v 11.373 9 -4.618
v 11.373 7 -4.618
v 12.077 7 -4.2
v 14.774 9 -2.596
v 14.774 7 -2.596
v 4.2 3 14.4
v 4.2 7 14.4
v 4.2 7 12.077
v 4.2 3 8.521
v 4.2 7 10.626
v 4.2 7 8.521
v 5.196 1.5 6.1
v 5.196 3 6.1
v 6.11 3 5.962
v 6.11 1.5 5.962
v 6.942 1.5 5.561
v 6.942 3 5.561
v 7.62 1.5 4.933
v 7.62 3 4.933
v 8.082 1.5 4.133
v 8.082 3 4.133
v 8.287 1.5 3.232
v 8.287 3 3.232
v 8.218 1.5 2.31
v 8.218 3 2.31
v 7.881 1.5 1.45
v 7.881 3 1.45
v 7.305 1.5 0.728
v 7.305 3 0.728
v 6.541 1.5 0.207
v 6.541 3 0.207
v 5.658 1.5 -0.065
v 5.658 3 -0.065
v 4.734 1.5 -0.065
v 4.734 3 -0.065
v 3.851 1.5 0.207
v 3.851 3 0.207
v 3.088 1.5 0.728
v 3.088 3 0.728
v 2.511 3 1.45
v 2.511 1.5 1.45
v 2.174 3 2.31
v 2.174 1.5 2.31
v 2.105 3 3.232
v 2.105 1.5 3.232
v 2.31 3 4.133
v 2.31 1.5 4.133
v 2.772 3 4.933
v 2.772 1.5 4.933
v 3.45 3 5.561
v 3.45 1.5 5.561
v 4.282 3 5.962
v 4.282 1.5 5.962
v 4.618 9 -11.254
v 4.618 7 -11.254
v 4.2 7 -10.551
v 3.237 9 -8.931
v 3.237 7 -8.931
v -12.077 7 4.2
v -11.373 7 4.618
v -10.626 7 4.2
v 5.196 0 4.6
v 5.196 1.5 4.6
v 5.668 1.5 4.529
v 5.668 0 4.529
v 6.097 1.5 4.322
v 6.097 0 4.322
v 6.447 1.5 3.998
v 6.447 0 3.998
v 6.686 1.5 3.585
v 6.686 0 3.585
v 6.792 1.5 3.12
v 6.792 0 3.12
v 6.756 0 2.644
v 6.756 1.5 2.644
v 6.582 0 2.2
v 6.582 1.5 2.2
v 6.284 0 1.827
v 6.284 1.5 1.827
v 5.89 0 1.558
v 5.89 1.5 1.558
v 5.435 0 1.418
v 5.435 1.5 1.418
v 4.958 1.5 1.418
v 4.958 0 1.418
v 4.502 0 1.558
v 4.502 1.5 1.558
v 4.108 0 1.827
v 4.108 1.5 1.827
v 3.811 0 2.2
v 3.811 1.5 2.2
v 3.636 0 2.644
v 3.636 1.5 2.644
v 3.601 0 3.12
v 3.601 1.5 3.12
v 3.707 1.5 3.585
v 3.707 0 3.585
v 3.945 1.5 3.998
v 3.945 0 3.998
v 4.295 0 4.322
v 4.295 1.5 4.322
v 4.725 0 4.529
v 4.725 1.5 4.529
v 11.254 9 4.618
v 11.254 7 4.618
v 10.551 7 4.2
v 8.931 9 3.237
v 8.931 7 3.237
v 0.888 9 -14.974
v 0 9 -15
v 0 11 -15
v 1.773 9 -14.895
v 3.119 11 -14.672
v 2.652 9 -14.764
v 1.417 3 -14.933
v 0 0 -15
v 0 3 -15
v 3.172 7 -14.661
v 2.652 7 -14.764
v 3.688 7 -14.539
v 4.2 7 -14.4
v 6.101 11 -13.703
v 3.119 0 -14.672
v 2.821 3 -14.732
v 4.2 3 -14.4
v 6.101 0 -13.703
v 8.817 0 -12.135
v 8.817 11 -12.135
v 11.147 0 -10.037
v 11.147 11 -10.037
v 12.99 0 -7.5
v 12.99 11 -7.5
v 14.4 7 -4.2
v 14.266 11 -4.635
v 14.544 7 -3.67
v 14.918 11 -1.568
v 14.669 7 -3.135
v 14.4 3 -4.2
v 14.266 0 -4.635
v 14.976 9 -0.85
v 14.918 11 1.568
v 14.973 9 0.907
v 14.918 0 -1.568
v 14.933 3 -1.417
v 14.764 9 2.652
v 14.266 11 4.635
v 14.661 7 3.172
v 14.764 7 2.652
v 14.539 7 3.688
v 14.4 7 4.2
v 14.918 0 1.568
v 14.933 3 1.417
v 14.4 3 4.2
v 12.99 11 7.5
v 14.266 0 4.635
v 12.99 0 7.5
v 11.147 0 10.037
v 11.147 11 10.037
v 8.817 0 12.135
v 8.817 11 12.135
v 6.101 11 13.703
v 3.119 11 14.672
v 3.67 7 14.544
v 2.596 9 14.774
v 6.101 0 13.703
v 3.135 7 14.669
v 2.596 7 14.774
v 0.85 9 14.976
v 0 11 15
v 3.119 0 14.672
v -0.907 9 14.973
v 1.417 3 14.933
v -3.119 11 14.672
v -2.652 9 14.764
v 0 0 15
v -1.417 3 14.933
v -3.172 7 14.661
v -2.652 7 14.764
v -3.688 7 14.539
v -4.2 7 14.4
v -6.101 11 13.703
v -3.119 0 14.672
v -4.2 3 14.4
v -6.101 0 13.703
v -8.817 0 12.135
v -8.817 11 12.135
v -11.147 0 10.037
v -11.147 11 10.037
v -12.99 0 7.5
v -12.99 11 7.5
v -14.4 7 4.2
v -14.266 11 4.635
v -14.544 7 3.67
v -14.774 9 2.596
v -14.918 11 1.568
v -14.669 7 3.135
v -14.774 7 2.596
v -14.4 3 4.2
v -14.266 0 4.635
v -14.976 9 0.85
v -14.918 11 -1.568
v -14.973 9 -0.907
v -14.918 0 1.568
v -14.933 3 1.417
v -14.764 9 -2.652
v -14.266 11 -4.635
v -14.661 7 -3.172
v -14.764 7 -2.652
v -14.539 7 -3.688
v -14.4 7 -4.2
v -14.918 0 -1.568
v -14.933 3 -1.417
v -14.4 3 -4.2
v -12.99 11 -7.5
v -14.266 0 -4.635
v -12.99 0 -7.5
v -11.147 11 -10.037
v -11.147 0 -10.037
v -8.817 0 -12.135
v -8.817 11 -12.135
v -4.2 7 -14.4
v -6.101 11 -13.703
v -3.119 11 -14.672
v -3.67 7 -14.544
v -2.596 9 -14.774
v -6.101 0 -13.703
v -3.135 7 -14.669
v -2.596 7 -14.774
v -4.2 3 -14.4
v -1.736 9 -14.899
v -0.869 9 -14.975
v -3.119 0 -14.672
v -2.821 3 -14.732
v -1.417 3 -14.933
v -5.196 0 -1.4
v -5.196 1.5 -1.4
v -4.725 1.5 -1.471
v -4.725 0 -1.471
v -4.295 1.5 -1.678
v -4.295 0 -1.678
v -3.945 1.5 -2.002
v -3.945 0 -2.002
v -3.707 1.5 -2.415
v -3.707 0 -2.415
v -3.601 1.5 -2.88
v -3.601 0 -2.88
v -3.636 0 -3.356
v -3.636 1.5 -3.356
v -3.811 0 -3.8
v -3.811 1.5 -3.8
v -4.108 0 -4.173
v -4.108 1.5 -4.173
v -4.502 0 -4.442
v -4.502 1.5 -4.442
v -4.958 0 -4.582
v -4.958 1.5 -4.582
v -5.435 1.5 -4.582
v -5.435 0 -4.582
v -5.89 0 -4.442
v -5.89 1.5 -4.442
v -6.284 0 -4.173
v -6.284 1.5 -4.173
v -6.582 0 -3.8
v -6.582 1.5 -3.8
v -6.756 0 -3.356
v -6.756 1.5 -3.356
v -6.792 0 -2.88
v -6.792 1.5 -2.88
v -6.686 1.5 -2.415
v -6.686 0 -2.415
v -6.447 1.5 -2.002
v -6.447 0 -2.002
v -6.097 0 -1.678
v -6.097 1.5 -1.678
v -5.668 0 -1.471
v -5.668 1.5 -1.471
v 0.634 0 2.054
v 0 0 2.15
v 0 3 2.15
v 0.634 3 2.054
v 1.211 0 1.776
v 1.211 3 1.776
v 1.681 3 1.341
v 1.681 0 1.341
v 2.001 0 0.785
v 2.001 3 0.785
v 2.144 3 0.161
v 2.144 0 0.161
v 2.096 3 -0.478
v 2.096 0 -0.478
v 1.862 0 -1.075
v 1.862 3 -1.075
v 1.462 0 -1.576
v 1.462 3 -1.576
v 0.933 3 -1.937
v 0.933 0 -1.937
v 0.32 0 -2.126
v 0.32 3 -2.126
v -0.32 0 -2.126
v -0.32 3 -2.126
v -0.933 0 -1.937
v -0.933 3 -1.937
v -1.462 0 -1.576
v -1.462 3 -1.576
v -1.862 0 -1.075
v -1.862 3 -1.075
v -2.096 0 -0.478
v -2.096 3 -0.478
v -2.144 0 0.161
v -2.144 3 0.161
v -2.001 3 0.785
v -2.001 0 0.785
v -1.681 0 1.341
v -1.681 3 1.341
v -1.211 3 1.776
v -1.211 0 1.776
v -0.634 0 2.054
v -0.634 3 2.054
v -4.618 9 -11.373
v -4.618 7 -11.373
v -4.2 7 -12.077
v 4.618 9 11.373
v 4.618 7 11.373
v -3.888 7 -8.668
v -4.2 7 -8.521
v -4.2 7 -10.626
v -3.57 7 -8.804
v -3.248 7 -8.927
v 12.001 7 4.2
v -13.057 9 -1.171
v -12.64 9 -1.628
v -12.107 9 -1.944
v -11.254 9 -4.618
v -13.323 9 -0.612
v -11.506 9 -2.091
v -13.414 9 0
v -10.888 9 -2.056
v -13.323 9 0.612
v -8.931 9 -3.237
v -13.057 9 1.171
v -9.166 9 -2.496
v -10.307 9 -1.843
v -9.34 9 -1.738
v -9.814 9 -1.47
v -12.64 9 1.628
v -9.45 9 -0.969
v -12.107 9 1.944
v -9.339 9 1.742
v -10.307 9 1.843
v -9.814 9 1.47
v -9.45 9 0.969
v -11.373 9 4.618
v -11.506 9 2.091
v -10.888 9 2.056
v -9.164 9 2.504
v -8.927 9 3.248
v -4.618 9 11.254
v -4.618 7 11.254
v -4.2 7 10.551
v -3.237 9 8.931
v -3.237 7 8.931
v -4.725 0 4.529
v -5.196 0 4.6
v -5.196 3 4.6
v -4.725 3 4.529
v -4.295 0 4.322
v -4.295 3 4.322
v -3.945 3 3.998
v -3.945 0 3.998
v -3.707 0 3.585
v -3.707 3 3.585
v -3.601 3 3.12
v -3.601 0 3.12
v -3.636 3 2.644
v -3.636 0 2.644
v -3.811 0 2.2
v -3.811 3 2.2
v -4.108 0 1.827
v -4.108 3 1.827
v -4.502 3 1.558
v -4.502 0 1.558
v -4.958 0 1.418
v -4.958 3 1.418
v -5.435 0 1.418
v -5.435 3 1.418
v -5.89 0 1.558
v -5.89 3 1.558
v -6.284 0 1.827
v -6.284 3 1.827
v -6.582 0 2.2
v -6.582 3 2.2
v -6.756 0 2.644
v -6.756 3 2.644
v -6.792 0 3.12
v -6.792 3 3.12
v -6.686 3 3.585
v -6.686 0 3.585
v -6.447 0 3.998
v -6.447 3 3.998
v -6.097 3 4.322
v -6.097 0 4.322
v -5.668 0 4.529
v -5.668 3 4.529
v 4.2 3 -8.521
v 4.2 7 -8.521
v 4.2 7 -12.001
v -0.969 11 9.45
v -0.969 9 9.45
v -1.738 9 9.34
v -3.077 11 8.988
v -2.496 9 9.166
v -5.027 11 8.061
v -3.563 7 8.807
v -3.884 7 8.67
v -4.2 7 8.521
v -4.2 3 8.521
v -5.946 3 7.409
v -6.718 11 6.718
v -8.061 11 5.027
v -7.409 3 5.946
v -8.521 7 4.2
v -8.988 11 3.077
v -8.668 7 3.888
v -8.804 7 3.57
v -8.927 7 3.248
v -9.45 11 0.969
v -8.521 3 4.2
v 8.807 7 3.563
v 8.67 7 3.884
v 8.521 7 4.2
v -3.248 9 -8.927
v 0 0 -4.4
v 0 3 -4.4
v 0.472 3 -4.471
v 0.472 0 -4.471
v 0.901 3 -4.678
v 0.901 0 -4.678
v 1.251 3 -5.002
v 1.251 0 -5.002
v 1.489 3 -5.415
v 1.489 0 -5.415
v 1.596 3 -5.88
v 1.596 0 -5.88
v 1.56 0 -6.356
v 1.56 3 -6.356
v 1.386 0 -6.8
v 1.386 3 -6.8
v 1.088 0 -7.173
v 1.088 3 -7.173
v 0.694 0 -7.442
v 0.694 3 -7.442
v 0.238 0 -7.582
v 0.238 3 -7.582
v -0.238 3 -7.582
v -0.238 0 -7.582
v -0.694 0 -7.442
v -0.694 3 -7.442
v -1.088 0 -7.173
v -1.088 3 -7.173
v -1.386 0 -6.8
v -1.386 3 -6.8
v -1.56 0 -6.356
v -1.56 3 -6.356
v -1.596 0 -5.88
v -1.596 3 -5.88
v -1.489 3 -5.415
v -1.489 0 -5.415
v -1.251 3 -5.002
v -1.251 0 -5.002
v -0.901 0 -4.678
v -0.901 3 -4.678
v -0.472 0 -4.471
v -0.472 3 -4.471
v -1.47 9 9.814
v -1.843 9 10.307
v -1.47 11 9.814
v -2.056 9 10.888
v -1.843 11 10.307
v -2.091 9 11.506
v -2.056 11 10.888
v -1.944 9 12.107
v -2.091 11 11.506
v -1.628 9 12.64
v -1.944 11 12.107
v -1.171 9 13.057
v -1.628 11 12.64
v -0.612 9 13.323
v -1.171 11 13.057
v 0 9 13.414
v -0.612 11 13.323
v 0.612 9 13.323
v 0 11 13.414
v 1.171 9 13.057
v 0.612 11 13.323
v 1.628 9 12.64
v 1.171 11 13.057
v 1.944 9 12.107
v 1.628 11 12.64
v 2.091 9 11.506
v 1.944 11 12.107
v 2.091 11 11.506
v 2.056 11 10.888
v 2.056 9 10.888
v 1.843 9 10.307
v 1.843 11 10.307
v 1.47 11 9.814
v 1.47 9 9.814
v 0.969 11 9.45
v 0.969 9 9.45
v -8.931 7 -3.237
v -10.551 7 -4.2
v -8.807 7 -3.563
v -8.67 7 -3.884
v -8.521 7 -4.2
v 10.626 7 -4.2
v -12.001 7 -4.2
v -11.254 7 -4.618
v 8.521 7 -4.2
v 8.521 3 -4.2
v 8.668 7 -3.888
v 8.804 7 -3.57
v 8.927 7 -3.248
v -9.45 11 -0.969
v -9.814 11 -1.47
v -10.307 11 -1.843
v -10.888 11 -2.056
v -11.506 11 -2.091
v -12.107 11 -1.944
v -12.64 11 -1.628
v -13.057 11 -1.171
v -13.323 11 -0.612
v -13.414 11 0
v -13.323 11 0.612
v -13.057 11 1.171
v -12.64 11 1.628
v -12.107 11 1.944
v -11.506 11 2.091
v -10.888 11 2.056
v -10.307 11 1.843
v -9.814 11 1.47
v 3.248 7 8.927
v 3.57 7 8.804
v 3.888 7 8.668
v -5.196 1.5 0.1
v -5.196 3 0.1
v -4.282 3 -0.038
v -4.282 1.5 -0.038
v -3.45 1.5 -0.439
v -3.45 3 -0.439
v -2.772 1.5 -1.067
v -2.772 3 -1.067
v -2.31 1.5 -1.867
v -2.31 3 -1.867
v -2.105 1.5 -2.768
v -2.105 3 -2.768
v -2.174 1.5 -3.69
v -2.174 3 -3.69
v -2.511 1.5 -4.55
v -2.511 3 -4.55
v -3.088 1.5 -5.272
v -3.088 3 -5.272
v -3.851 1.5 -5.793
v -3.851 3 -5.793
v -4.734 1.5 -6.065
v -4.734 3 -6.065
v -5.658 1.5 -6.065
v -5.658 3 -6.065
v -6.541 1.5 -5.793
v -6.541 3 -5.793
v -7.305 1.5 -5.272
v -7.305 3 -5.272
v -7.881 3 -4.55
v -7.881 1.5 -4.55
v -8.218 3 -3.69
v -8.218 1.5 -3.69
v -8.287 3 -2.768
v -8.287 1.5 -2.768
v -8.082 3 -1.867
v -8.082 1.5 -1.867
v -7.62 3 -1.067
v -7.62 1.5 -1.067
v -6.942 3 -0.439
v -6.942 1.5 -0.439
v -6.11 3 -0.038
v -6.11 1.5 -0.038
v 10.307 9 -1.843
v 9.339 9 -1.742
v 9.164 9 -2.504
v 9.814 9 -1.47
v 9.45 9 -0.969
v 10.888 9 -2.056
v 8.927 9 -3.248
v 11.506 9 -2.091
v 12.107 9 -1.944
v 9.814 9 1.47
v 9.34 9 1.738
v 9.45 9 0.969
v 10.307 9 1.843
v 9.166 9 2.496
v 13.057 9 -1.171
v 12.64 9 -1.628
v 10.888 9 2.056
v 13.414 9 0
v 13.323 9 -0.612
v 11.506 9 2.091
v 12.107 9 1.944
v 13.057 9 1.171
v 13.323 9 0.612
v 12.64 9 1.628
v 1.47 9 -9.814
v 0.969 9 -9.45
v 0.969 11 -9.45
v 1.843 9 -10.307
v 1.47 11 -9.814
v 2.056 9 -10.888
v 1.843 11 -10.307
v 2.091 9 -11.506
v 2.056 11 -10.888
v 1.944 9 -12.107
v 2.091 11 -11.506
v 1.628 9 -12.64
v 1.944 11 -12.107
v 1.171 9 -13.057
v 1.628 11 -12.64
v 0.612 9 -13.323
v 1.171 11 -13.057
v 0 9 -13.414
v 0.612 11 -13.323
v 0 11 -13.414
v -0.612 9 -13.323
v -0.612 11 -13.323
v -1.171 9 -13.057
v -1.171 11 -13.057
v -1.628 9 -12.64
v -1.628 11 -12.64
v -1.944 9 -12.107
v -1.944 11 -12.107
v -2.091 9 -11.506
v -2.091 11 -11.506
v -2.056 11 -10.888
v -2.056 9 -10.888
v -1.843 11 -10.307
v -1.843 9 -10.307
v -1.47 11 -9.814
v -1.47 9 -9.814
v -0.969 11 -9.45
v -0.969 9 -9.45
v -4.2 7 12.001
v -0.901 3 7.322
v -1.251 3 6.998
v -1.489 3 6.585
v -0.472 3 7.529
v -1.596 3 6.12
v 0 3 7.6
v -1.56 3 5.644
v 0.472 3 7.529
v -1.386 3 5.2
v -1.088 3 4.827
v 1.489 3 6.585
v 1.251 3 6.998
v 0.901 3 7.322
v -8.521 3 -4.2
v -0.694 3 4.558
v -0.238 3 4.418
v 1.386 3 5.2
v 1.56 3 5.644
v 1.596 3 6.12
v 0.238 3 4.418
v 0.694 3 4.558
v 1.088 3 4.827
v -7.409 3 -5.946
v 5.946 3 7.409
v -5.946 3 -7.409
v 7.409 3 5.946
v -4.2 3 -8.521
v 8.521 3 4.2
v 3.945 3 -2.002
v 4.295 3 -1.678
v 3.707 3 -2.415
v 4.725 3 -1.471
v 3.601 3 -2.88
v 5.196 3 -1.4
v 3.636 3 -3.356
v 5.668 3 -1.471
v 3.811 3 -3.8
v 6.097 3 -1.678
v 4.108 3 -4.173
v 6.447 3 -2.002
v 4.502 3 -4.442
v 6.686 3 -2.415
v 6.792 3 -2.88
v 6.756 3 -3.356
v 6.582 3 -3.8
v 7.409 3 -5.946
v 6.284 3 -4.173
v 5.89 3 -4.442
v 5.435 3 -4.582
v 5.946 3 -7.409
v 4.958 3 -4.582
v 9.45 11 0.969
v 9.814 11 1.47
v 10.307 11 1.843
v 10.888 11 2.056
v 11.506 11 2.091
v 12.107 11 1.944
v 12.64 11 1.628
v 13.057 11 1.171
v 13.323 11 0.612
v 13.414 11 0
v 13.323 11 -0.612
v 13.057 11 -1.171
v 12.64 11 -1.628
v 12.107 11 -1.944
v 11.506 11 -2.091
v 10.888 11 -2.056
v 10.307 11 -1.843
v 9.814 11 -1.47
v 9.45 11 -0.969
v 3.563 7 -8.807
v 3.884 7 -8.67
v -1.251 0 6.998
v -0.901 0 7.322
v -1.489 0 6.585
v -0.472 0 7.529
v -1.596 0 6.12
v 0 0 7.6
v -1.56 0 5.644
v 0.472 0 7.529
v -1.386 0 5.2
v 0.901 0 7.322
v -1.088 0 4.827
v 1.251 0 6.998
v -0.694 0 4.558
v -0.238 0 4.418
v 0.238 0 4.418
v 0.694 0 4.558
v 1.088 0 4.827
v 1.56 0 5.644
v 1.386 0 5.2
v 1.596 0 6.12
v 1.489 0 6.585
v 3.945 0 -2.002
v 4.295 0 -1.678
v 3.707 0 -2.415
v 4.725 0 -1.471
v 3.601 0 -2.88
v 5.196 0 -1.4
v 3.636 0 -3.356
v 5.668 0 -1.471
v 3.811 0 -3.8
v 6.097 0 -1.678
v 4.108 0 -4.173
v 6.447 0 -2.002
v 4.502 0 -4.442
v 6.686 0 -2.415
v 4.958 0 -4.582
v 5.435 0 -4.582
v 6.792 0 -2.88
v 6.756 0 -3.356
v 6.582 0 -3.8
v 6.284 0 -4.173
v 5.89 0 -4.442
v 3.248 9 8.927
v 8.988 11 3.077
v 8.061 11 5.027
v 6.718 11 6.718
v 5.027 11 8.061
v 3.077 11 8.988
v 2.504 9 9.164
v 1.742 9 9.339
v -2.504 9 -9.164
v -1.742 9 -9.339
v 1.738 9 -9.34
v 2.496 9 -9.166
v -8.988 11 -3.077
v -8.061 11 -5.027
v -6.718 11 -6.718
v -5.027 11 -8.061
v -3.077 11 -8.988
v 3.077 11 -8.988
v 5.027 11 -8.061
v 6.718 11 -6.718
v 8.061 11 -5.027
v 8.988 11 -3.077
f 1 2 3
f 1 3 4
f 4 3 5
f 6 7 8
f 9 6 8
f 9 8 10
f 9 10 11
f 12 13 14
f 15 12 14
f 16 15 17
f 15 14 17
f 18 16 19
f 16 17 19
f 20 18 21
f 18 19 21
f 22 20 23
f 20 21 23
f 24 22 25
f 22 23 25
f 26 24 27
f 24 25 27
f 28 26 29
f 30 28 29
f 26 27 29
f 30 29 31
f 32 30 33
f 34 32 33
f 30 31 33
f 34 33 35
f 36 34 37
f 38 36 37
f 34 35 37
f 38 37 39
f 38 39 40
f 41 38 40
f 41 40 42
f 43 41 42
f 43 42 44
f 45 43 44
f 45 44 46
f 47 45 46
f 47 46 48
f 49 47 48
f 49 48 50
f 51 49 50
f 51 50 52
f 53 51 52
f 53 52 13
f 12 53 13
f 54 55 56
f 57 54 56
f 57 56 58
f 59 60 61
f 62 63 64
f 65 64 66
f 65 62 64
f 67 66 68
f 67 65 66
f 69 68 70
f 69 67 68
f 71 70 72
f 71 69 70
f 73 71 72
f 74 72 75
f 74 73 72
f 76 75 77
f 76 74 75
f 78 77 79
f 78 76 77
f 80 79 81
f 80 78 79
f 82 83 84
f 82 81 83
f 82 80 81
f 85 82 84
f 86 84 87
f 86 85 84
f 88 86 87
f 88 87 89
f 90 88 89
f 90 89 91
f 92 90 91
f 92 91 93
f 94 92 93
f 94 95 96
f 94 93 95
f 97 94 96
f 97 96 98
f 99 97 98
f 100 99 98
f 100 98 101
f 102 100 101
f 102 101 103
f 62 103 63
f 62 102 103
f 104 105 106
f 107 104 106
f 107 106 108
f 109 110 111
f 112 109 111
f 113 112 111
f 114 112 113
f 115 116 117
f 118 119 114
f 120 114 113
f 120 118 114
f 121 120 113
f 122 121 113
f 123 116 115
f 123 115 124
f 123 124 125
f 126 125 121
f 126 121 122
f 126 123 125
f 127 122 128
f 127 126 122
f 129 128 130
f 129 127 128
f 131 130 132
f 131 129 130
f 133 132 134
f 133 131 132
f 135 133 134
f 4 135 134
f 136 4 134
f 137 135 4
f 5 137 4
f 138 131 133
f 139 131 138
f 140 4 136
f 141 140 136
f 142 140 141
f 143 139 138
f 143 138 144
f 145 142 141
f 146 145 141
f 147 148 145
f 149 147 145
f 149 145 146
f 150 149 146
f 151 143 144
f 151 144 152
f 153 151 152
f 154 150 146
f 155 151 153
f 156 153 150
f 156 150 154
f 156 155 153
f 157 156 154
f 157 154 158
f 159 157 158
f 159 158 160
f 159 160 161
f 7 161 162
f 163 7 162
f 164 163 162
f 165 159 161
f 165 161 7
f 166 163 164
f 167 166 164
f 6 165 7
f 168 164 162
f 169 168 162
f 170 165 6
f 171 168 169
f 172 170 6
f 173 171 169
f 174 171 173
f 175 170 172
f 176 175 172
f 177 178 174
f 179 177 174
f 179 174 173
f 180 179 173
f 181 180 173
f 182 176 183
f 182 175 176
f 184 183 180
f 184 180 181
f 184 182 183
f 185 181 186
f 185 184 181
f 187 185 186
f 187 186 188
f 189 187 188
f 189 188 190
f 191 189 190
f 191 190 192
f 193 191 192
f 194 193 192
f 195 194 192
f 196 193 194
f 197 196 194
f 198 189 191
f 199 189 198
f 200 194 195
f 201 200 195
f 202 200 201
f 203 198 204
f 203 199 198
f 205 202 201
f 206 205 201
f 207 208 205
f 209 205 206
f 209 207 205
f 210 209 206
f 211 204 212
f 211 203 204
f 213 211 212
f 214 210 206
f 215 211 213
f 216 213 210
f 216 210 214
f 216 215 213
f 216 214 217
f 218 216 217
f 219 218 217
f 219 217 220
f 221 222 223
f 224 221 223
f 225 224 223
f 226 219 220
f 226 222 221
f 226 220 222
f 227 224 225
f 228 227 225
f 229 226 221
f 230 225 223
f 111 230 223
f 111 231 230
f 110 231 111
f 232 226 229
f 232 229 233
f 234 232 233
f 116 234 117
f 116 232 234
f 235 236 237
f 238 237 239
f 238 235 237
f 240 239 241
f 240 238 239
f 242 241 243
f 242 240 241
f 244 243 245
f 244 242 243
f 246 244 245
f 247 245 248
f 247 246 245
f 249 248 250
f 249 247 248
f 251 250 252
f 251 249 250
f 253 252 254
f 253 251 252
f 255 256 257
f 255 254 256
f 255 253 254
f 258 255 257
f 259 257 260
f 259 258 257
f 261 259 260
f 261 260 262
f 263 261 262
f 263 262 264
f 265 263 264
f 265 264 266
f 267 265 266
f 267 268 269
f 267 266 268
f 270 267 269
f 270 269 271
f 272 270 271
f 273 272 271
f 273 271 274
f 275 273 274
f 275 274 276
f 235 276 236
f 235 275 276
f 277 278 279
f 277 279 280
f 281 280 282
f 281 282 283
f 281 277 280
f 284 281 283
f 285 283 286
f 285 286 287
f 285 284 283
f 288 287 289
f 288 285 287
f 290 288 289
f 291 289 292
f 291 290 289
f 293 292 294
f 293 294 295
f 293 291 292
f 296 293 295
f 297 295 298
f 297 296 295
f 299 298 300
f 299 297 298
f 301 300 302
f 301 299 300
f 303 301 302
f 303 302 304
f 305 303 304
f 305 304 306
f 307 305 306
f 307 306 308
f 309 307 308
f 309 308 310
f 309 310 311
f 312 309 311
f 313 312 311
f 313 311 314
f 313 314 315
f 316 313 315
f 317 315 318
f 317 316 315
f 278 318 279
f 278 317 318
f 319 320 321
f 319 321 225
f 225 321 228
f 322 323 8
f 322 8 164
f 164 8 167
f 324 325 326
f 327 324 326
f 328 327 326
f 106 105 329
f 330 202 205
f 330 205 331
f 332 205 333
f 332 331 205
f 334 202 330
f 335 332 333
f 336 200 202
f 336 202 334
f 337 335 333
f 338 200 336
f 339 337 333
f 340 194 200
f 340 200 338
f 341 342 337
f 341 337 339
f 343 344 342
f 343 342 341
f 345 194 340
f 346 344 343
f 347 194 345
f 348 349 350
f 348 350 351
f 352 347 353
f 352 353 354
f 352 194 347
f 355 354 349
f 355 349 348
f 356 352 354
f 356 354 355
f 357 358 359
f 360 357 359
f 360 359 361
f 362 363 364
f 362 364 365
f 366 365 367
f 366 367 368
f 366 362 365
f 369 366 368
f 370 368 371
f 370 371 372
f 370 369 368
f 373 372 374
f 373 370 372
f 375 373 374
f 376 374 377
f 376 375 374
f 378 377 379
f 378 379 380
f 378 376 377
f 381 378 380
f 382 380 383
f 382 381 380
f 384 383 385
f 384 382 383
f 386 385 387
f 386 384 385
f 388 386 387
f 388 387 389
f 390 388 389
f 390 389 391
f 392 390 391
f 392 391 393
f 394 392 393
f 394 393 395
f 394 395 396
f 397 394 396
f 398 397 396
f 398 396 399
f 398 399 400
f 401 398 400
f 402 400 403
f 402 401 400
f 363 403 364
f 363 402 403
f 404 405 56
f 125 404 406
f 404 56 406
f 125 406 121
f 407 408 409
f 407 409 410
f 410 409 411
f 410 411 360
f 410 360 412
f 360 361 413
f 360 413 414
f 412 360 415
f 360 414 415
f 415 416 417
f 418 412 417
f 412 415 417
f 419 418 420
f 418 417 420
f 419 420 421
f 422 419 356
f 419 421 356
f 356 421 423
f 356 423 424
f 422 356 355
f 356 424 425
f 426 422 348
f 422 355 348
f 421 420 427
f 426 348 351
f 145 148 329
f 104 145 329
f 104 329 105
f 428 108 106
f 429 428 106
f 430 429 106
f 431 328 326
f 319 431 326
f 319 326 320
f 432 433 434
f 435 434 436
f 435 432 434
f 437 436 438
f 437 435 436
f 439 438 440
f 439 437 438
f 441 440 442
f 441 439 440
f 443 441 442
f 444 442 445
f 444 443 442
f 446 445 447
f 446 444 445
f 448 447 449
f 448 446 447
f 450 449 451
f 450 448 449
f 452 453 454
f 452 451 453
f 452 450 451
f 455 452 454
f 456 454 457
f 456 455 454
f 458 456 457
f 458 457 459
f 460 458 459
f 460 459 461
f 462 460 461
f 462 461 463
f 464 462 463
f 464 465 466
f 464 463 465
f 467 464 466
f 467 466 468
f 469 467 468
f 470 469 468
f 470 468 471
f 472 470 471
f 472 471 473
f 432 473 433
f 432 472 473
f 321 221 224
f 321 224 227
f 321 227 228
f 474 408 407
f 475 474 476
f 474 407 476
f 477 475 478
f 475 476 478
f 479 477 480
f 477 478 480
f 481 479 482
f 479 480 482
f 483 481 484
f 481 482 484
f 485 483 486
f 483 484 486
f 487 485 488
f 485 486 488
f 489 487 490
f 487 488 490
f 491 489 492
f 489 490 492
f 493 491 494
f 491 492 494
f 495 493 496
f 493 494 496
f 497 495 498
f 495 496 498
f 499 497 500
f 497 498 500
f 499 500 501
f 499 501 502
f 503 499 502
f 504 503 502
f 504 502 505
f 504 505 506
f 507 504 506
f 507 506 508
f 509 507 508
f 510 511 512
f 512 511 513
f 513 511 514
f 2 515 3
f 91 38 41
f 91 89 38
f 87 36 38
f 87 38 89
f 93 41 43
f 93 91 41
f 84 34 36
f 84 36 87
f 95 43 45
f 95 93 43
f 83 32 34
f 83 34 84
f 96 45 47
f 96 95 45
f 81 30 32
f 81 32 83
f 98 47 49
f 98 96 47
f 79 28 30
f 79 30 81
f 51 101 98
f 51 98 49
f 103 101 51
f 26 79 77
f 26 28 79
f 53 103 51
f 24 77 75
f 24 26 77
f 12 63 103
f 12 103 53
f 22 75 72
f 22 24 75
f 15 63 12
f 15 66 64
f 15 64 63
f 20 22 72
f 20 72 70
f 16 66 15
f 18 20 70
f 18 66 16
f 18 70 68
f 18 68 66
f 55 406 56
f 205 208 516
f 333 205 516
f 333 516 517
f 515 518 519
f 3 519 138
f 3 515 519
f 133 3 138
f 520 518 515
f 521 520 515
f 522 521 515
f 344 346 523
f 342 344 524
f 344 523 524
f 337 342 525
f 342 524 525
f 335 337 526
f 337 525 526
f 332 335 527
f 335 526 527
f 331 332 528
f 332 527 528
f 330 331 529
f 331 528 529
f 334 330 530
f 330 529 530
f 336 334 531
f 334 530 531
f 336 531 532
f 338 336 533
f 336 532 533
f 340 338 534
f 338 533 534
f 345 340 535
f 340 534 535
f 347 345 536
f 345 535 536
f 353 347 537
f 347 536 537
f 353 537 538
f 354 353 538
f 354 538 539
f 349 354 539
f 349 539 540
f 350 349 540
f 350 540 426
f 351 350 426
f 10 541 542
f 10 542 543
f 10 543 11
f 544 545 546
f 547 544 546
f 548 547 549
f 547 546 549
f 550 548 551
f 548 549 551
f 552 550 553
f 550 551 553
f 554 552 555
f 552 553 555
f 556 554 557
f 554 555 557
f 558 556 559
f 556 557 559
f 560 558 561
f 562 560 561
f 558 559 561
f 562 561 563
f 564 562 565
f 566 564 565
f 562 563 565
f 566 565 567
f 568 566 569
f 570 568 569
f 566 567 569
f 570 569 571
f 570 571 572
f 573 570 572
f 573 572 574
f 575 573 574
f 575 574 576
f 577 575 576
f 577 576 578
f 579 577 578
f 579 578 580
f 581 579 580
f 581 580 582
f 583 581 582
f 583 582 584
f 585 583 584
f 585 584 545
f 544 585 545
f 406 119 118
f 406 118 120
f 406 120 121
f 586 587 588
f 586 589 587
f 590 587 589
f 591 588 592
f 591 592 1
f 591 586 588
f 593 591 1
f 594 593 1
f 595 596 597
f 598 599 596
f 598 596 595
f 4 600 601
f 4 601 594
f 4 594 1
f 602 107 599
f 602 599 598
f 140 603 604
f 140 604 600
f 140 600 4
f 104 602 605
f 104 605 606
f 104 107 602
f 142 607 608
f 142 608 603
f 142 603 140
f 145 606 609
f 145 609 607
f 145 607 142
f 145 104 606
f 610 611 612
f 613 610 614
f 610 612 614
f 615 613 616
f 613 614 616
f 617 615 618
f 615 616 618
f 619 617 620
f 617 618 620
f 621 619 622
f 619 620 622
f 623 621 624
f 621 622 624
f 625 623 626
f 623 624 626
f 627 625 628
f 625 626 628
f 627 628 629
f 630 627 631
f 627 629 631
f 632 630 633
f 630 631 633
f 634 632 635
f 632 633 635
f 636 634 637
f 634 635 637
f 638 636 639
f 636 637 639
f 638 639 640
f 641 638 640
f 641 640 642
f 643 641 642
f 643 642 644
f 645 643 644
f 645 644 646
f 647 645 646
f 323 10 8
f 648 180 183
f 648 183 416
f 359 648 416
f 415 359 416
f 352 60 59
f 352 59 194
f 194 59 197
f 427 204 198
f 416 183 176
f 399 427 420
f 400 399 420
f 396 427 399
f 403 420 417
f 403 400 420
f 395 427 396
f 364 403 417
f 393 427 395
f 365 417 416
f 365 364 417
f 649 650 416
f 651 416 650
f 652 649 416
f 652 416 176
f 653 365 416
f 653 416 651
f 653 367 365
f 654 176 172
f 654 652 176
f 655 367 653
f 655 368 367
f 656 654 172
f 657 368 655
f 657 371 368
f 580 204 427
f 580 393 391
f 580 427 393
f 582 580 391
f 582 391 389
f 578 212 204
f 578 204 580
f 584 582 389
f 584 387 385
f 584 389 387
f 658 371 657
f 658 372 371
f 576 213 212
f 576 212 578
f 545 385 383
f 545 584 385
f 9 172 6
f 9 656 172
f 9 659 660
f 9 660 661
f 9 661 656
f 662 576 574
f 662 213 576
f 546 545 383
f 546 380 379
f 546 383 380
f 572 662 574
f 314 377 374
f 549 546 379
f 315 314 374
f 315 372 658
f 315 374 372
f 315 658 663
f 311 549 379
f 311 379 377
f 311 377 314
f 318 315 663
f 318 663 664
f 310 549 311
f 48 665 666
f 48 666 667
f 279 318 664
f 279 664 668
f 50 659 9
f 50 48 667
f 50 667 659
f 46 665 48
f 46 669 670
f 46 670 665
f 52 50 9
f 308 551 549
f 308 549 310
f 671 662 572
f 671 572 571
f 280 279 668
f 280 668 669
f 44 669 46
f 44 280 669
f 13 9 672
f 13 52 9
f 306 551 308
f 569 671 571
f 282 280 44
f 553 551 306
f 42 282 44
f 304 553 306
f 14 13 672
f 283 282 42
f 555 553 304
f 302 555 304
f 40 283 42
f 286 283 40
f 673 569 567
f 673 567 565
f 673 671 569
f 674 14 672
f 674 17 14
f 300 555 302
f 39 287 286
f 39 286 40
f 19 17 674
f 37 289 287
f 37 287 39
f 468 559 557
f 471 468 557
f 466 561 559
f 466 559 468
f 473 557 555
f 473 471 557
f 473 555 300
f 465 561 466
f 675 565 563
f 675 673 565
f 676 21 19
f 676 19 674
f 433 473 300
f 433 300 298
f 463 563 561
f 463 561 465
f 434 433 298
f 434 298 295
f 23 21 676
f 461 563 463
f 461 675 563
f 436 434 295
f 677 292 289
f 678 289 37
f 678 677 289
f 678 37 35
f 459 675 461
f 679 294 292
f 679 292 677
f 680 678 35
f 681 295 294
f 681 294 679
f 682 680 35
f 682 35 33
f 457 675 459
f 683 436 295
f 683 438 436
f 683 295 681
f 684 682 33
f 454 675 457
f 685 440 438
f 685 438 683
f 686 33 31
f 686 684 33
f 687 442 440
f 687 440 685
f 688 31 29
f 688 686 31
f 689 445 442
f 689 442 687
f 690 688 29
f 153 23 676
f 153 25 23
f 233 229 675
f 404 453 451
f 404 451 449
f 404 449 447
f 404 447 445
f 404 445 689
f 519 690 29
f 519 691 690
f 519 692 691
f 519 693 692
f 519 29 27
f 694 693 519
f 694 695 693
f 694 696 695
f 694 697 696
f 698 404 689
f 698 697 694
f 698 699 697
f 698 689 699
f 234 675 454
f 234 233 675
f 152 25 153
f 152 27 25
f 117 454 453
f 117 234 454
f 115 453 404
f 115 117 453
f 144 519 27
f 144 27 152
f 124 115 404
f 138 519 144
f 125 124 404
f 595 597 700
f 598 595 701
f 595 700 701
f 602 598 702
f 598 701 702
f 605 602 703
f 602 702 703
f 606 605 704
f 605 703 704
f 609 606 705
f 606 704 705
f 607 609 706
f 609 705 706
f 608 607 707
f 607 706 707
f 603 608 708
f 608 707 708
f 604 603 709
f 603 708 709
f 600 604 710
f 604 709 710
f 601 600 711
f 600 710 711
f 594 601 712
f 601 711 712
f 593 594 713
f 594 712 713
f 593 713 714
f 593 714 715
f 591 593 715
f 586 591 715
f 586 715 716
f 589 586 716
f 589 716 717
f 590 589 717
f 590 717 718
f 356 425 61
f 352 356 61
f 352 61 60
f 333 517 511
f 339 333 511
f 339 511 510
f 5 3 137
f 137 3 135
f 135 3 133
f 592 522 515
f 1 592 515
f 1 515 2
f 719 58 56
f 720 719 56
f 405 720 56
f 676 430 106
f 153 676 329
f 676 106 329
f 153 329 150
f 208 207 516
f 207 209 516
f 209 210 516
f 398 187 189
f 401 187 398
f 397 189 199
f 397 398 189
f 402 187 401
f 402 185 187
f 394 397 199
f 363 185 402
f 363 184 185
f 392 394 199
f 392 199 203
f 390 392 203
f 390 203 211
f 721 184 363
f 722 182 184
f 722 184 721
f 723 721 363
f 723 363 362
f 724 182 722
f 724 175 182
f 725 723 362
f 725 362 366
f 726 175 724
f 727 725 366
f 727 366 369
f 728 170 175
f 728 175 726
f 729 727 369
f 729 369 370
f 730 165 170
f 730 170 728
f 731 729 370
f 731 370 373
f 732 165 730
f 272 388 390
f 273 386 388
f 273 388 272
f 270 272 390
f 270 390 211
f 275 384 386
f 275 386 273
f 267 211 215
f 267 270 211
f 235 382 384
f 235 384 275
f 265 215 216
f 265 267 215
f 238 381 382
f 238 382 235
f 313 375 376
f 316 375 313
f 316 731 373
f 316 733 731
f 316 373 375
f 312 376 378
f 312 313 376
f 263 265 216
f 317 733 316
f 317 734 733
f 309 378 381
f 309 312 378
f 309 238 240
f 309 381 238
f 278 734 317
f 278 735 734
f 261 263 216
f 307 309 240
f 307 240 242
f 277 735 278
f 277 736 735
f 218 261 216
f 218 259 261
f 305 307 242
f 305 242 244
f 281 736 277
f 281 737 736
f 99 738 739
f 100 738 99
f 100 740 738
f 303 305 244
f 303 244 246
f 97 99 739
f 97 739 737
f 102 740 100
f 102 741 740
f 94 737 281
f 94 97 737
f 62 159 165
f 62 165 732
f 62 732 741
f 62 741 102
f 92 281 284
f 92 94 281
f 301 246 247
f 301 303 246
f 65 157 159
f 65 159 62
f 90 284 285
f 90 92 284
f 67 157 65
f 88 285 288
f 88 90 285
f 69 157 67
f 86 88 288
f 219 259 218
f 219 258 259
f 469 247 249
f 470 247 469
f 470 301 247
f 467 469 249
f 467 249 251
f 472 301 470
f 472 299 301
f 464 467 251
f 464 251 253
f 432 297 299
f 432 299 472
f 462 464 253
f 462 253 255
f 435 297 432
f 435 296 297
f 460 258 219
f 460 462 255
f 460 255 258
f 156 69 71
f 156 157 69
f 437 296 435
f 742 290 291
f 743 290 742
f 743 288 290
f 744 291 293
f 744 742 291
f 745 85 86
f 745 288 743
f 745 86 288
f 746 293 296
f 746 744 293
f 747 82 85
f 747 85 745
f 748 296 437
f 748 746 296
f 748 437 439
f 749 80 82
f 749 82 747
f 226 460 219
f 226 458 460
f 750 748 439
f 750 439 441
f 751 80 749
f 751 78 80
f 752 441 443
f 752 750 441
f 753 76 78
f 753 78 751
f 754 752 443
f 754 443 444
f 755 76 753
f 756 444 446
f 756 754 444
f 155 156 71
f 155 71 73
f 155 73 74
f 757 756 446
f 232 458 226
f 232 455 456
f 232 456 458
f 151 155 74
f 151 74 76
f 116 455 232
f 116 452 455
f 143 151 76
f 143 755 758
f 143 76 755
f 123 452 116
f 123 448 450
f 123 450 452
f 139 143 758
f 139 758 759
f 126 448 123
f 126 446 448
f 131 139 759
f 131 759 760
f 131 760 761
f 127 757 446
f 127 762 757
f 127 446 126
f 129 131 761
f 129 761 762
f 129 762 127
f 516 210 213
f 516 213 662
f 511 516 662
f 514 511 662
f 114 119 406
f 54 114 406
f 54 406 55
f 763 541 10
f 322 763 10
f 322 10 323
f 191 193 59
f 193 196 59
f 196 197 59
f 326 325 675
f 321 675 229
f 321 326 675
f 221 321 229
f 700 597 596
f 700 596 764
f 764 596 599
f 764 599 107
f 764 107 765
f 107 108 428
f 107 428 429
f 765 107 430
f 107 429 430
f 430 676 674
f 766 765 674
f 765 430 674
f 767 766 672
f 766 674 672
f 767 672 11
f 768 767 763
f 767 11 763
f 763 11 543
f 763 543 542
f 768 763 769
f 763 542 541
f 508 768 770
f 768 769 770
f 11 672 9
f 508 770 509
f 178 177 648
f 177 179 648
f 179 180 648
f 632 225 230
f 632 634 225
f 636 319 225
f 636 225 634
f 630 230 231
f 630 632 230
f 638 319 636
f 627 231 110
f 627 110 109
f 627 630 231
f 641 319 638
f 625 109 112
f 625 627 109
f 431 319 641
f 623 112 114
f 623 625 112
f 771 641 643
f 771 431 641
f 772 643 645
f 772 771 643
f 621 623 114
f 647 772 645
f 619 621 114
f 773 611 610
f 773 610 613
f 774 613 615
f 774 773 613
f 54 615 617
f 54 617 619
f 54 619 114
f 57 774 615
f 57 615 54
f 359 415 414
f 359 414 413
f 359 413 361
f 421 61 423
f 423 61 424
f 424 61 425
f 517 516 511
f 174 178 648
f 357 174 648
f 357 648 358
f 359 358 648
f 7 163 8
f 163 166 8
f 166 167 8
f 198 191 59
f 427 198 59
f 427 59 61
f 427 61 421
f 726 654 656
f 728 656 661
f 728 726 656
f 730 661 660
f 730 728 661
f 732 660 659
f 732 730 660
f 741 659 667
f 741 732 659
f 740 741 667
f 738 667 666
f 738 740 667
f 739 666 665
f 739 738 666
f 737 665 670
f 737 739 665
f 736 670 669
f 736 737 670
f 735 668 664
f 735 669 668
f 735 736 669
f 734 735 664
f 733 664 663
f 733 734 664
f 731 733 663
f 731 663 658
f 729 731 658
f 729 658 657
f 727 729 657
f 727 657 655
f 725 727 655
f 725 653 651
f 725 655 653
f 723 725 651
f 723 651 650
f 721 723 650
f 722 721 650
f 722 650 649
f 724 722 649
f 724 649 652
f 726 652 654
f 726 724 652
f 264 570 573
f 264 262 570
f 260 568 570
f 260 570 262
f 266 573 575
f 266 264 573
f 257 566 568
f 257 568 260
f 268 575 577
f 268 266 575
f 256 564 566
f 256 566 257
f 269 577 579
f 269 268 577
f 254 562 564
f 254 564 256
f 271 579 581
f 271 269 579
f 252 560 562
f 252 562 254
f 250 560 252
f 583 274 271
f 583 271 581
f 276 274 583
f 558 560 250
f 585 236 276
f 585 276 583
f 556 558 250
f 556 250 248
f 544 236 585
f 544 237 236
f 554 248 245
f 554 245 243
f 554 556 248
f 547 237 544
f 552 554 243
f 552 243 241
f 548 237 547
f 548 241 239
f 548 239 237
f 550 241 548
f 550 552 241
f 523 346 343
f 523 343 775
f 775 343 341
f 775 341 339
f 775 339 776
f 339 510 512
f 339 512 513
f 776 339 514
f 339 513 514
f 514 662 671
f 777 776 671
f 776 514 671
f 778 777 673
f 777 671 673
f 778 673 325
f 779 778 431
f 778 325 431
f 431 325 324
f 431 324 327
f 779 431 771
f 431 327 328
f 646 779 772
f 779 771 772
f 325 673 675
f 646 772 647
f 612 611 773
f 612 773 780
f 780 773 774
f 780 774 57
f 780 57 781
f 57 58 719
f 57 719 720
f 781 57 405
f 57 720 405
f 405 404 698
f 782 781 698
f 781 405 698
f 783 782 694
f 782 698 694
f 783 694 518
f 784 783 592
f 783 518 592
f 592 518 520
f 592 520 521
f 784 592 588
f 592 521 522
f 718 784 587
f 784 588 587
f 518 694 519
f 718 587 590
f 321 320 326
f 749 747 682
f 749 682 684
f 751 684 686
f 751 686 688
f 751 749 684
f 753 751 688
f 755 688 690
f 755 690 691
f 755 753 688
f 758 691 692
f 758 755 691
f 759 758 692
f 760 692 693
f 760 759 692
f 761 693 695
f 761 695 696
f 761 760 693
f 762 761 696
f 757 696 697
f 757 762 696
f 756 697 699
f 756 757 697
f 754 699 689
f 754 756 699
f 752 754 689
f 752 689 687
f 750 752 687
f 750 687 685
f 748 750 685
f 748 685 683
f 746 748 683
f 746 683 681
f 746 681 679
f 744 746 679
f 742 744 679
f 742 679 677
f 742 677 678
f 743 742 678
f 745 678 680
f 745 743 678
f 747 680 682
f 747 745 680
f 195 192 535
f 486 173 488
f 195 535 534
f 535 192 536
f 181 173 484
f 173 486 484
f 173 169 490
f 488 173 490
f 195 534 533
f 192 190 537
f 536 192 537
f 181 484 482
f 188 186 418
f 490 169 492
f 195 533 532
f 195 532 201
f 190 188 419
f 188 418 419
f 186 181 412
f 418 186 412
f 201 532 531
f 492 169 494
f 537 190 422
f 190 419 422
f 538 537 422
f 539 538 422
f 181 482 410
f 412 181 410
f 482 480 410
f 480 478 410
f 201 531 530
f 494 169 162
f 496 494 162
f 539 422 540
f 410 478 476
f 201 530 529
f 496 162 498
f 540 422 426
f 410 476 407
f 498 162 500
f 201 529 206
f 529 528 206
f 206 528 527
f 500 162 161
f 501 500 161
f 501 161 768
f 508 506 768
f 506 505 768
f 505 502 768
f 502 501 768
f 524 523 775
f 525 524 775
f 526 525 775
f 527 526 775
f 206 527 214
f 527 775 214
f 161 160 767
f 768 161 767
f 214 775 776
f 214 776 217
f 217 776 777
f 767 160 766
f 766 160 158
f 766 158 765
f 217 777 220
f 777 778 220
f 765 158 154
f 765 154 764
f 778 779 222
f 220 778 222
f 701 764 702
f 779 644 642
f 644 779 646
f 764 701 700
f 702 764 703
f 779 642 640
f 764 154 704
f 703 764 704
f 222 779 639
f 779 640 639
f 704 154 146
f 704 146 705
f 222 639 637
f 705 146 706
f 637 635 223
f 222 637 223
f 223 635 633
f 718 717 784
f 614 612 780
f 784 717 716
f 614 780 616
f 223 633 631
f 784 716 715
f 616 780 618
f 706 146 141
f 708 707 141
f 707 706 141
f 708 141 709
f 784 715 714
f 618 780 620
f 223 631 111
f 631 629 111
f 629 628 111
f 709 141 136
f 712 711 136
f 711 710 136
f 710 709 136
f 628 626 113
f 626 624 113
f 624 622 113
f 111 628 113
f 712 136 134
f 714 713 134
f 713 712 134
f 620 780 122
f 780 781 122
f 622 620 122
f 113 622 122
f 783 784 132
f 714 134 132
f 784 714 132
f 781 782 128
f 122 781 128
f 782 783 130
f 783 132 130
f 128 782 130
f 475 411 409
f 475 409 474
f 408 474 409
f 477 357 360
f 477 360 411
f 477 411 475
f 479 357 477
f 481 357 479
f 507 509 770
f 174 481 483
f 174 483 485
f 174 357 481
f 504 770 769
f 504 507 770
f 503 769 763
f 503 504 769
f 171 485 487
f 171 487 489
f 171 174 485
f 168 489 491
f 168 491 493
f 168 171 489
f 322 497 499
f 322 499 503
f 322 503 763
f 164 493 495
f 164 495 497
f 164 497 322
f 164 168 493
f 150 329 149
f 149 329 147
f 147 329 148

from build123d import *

# Parameters (mm, degrees)
SKETCH1_R           = 10
SKETCH1_R_2         = 1.6
SKETCH1_R_3         = 2.15
BOSS_EXTRUDE1_DEPTH = 3
SKETCH2_R           = 3.1
CUT_EXTRUDE2_DEPTH  = 1.5
SKETCH3_R           = 15
SKETCH3_R_2         = 9.5
BOSS_EXTRUDE2_DEPTH = 11
SKETCH5_R           = 2.1
CUT_EXTRUDE3_DEPTH  = 4
SKETCH7_W           = 10
SKETCH7_H           = 8.4
SKETCH7_W_2         = 8.4
SKETCH7_H_2         = 10
CUT_EXTRUDE4_DEPTH  = 4
CUT_EXTRUDE6_DEPTH  = 2


with BuildPart() as part:
    # Sketch1 → Boss-Extrude1 (new body)
    with BuildSketch(Plane(origin=(0, 0, 0), x_dir=(1, 0, 0), z_dir=(0, 1, 0))):
        with Locations(Location((0, 0, 0), (0, 0, 270))):
            Circle(SKETCH1_R)
        with Locations(Location((0, 6, 0), (0, 0, 270))):
            Circle(SKETCH1_R_2, mode=Mode.SUBTRACT)
        with Locations(Location((5.196152423, 3, 0), (0, 0, 270))):
            Circle(SKETCH1_R_2, mode=Mode.SUBTRACT)
        with Locations(Location((5.196152423, -3, 0), (0, 0, 270))):
            Circle(SKETCH1_R_2, mode=Mode.SUBTRACT)
        with Locations(Location((0, -6, 0), (0, 0, 270))):
            Circle(SKETCH1_R_2, mode=Mode.SUBTRACT)
        with Locations(Location((-5.196152423, -3, 0), (0, 0, 270))):
            Circle(SKETCH1_R_2, mode=Mode.SUBTRACT)
        with Locations(Location((-5.196152423, 3, 0), (0, 0, 270))):
            Circle(SKETCH1_R_2, mode=Mode.SUBTRACT)
        with Locations(Location((0, 0, 0), (0, 0, 270))):
            Circle(SKETCH1_R_3, mode=Mode.SUBTRACT)
    extrude(amount=BOSS_EXTRUDE1_DEPTH)

    # Sketch2 → Cut-Extrude2 (cut)
    with BuildSketch(Plane(origin=(0, 3, 0), x_dir=(1, 0, 0), z_dir=(0, 1, 0))):
        with Locations(Location((-5.196152423, 3, 0), (0, 0, 270))):
            Circle(SKETCH2_R)
        with Locations(Location((5.196152423, -3, 0), (0, 0, 270))):
            Circle(SKETCH2_R)
    extrude(amount=-CUT_EXTRUDE2_DEPTH, mode=Mode.SUBTRACT)

    # Sketch3 → Boss-Extrude2 (add)
    with BuildSketch(Plane.XZ):
        with Locations(Location((0, 0, 0), (0, 0, 270))):
            Circle(SKETCH3_R)
        with Locations(Location((0, 0, 0), (0, 0, 270))):
            Circle(SKETCH3_R_2, mode=Mode.SUBTRACT)
    extrude(amount=-BOSS_EXTRUDE2_DEPTH)

    # Sketch5 → Cut-Extrude3 (cut)
    with BuildSketch(Plane(origin=(0, 11, 0), x_dir=(1, 0, 0), z_dir=(0, 1, 0))):
        with Locations((0, 11.313708499)):
            Circle(SKETCH5_R)
        with Locations((11.313708499, 0)):
            Circle(SKETCH5_R)
        with Locations((0, -11.313708499)):
            Circle(SKETCH5_R)
        with Locations((-11.313708499, 0)):
            Circle(SKETCH5_R)
    extrude(amount=-CUT_EXTRUDE3_DEPTH, mode=Mode.SUBTRACT)

    # Sketch7 → Cut-Extrude4 (cut)
    with BuildSketch(Plane(origin=(0, 7, 0), x_dir=(1, 0, 0), z_dir=(0, 1, 0))):
        with Locations((-12.313708499, 0)):
            Rectangle(SKETCH7_W, SKETCH7_H)
        with Locations((0, 12.313708499)):
            Rectangle(SKETCH7_W_2, SKETCH7_H_2)
        with Locations((12.313708499, 0)):
            Rectangle(SKETCH7_W, SKETCH7_H)
        with Locations((0, -12.313708499)):
            Rectangle(SKETCH7_W_2, SKETCH7_H_2)
    extrude(amount=-CUT_EXTRUDE4_DEPTH, mode=Mode.SUBTRACT)

    # Sketch8 → Cut-Extrude6 (cut)
    with BuildSketch(Plane.XZ.offset(-7)):
        Polygon((-2.257631932, 7.284262955), (2.360786238, 7.343819121), (4.61841817, 11.373264666), (2.257631932, 15.343154043), (-2.360786238, 15.283597877), (-4.61841817, 11.254152332), align=None)
        Polygon((-7.284262955, -2.257631932), (-7.343819121, 2.360786238), (-11.373264666, 4.61841817), (-15.343154043, 2.257631932), (-15.283597877, -2.360786238), (-11.254152332, -4.61841817), align=None)
        Polygon((7.284262955, 2.257631932), (7.343819121, -2.360786238), (11.373264666, -4.61841817), (15.343154043, -2.257631932), (15.283597877, 2.360786238), (11.254152332, 4.61841817), align=None)
        Polygon((2.257631932, -7.284262955), (-2.360786238, -7.343819121), (-4.61841817, -11.373264666), (-2.257631932, -15.343154043), (2.360786238, -15.283597877), (4.61841817, -11.254152332), align=None)
    extrude(amount=-CUT_EXTRUDE6_DEPTH, mode=Mode.SUBTRACT)


solid = part.part
